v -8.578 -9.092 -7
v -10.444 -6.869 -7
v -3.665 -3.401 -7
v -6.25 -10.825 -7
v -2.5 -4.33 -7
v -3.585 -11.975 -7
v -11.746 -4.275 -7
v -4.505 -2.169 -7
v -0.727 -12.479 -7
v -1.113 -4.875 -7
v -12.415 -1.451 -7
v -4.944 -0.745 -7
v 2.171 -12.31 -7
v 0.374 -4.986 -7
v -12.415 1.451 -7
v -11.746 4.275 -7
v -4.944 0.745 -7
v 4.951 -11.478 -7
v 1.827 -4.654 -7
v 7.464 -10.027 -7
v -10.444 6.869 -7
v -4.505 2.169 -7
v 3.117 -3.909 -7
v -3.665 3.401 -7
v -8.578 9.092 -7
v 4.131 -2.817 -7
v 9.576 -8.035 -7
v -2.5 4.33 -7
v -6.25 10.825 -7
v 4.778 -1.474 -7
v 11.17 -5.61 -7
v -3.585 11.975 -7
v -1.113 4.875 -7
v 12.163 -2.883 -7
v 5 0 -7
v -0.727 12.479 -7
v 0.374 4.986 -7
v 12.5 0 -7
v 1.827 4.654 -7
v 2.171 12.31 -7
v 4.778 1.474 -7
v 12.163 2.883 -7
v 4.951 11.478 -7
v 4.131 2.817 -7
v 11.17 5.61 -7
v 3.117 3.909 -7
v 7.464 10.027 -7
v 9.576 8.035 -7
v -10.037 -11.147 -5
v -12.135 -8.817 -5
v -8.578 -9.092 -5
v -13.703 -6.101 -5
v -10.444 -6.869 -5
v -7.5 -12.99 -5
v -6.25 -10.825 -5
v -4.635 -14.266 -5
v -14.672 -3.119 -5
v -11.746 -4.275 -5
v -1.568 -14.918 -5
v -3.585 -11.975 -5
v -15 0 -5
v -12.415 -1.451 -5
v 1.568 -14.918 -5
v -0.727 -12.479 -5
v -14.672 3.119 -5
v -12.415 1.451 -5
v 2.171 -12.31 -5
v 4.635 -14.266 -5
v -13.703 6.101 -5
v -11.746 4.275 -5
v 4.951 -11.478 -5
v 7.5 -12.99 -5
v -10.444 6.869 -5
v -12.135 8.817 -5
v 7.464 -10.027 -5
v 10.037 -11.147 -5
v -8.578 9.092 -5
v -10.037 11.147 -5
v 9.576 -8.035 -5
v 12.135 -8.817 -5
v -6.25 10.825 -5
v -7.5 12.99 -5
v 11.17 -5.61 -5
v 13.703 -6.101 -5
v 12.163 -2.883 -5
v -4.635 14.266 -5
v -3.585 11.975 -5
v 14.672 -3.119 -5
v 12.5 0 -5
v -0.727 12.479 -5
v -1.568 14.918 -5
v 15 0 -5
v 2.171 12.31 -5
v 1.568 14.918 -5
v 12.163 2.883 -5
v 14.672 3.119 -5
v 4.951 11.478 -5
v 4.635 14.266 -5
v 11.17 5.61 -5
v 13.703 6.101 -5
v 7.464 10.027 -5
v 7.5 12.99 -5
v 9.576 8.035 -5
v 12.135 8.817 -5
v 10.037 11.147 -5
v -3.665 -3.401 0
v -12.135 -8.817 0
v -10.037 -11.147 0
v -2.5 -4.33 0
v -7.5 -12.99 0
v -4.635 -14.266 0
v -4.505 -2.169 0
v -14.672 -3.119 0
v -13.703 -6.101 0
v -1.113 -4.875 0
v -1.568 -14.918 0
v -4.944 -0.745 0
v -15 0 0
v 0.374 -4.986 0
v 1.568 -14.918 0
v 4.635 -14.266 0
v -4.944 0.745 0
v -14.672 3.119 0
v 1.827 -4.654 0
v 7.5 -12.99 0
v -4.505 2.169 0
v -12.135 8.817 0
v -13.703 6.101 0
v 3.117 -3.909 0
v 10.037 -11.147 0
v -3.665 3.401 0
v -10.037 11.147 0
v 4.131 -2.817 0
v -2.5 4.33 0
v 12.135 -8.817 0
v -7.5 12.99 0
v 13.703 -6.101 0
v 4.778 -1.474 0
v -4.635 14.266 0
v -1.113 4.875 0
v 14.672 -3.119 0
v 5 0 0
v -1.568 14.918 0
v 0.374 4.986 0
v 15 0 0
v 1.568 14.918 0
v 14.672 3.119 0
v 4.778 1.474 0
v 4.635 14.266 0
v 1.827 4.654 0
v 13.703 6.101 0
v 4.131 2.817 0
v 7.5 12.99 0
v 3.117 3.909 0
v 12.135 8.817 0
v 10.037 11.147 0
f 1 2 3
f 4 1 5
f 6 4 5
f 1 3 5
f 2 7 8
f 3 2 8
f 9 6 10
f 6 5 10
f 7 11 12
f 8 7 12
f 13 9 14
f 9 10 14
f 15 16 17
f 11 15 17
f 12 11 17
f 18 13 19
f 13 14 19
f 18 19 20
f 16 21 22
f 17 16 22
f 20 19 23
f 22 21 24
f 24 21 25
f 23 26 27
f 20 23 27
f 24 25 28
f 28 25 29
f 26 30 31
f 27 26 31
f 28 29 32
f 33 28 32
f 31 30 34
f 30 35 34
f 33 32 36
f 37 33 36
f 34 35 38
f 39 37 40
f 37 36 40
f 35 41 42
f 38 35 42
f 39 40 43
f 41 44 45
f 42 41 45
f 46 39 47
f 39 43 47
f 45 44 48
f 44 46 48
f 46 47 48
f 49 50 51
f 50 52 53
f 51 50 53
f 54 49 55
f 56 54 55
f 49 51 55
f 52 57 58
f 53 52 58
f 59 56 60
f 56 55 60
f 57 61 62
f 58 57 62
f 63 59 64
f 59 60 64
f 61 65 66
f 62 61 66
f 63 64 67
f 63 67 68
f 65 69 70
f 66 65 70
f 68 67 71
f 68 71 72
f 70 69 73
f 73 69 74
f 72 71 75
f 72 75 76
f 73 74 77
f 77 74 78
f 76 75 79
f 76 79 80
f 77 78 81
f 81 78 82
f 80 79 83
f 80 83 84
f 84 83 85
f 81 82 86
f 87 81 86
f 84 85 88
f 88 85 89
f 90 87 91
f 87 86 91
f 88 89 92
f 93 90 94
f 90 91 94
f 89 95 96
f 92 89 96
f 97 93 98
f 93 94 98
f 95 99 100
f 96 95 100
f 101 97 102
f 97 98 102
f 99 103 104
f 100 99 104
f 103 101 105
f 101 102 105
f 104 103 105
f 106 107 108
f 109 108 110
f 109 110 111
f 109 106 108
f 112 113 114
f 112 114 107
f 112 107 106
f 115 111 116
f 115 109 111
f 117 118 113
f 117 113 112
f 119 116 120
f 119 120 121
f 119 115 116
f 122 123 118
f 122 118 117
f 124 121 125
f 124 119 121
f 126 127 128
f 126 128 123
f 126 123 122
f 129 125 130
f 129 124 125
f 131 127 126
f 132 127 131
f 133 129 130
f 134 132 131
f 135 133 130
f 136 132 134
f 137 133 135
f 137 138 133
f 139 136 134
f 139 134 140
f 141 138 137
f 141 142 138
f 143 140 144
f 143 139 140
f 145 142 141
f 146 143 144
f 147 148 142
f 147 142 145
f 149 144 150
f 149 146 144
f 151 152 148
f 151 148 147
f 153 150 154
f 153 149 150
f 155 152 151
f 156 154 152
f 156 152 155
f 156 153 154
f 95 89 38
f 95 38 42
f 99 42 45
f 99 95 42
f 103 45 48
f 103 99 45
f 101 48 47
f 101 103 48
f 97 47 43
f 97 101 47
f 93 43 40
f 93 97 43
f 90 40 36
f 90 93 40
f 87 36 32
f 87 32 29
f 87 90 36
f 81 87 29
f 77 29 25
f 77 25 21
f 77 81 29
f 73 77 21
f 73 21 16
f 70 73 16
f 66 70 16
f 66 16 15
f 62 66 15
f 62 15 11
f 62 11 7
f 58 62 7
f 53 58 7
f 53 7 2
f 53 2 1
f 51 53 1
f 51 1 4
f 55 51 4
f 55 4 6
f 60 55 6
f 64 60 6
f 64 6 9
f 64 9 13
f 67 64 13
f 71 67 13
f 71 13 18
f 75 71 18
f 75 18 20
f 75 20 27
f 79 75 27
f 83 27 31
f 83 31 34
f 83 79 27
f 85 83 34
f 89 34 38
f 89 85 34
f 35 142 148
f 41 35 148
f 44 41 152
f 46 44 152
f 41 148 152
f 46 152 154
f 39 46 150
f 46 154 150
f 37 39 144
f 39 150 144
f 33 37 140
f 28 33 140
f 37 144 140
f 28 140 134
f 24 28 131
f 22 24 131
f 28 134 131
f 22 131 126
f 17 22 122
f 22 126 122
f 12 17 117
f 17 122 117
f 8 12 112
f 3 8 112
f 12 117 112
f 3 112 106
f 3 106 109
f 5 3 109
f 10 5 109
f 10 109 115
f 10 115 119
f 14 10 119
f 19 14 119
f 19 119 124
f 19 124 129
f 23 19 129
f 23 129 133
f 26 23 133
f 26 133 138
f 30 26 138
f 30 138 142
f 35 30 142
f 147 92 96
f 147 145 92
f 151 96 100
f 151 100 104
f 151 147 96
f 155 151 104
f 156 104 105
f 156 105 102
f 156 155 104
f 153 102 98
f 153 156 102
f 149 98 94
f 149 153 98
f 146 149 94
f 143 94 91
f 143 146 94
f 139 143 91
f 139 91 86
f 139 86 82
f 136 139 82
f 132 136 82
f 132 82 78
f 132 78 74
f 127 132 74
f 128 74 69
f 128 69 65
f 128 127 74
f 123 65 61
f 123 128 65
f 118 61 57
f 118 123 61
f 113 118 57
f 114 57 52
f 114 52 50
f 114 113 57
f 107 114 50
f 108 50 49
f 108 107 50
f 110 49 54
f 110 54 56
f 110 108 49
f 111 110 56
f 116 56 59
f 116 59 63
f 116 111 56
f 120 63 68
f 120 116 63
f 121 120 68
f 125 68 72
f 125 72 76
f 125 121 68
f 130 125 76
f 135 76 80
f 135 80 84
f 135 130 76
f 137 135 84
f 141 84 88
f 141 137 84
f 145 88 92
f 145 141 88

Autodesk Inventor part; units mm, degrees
ref_plane "YZ Plane" through (0, 0, 0) normal (1, 0, 0) x (0, 1, 0)
ref_plane "XZ Plane" through (0, 0, 0) normal (0, 1, 0) x (-1, 0, 0)
ref_plane "XY Plane" through (0, 0, 0) normal (0, 0, 1) x (1, 0, 0)
sketch "Sketch2" plane through (0, 0, 0) normal (0, 0, 1) x (1, 0, 0)
  circle A0 centre (0, 0) radius 15
  dimension "d0" = 30
extrude "Extrusion1" add sketch "Sketch2" against normal blind 5
sketch "Sketch3" plane through (0, 0, 0) normal (0, 0, 1) x (1, 0, 0)
  circle A0 centre (0, 0) radius 12.5
  dimension "d3" = 25
extrude "Extrusion2" add sketch "Sketch3" against normal blind 7
sketch "Sketch4" plane through (0, 0, 0) normal (0, 0, 1) x (1, 0, 0)
  circle A0 centre (0, 0) radius 5
  dimension "d6" = 10
extrude "Extrusion3" cut sketch "Sketch4" against normal blind 7
equation "\"BendRadius\" = Thickness"
equation "\"BendReliefWidth\" = Thickness"
equation "\"BendReliefDepth\" = 0.5 * Thickness"
equation "\"CornerReliefSize\" = 4 * Thickness"
equation "\"MinimumRemnant\" = 2 * Thickness"
equation "\"TransitionRadius\" = BendRadius"
equation "\"JacobiRadiusSize\" = BendRadius"
equation "\"GapSize\" = Thickness"
equation "\"Thickness\" = 3.048"
properties part number "Bushing_beam_stempel_short"
